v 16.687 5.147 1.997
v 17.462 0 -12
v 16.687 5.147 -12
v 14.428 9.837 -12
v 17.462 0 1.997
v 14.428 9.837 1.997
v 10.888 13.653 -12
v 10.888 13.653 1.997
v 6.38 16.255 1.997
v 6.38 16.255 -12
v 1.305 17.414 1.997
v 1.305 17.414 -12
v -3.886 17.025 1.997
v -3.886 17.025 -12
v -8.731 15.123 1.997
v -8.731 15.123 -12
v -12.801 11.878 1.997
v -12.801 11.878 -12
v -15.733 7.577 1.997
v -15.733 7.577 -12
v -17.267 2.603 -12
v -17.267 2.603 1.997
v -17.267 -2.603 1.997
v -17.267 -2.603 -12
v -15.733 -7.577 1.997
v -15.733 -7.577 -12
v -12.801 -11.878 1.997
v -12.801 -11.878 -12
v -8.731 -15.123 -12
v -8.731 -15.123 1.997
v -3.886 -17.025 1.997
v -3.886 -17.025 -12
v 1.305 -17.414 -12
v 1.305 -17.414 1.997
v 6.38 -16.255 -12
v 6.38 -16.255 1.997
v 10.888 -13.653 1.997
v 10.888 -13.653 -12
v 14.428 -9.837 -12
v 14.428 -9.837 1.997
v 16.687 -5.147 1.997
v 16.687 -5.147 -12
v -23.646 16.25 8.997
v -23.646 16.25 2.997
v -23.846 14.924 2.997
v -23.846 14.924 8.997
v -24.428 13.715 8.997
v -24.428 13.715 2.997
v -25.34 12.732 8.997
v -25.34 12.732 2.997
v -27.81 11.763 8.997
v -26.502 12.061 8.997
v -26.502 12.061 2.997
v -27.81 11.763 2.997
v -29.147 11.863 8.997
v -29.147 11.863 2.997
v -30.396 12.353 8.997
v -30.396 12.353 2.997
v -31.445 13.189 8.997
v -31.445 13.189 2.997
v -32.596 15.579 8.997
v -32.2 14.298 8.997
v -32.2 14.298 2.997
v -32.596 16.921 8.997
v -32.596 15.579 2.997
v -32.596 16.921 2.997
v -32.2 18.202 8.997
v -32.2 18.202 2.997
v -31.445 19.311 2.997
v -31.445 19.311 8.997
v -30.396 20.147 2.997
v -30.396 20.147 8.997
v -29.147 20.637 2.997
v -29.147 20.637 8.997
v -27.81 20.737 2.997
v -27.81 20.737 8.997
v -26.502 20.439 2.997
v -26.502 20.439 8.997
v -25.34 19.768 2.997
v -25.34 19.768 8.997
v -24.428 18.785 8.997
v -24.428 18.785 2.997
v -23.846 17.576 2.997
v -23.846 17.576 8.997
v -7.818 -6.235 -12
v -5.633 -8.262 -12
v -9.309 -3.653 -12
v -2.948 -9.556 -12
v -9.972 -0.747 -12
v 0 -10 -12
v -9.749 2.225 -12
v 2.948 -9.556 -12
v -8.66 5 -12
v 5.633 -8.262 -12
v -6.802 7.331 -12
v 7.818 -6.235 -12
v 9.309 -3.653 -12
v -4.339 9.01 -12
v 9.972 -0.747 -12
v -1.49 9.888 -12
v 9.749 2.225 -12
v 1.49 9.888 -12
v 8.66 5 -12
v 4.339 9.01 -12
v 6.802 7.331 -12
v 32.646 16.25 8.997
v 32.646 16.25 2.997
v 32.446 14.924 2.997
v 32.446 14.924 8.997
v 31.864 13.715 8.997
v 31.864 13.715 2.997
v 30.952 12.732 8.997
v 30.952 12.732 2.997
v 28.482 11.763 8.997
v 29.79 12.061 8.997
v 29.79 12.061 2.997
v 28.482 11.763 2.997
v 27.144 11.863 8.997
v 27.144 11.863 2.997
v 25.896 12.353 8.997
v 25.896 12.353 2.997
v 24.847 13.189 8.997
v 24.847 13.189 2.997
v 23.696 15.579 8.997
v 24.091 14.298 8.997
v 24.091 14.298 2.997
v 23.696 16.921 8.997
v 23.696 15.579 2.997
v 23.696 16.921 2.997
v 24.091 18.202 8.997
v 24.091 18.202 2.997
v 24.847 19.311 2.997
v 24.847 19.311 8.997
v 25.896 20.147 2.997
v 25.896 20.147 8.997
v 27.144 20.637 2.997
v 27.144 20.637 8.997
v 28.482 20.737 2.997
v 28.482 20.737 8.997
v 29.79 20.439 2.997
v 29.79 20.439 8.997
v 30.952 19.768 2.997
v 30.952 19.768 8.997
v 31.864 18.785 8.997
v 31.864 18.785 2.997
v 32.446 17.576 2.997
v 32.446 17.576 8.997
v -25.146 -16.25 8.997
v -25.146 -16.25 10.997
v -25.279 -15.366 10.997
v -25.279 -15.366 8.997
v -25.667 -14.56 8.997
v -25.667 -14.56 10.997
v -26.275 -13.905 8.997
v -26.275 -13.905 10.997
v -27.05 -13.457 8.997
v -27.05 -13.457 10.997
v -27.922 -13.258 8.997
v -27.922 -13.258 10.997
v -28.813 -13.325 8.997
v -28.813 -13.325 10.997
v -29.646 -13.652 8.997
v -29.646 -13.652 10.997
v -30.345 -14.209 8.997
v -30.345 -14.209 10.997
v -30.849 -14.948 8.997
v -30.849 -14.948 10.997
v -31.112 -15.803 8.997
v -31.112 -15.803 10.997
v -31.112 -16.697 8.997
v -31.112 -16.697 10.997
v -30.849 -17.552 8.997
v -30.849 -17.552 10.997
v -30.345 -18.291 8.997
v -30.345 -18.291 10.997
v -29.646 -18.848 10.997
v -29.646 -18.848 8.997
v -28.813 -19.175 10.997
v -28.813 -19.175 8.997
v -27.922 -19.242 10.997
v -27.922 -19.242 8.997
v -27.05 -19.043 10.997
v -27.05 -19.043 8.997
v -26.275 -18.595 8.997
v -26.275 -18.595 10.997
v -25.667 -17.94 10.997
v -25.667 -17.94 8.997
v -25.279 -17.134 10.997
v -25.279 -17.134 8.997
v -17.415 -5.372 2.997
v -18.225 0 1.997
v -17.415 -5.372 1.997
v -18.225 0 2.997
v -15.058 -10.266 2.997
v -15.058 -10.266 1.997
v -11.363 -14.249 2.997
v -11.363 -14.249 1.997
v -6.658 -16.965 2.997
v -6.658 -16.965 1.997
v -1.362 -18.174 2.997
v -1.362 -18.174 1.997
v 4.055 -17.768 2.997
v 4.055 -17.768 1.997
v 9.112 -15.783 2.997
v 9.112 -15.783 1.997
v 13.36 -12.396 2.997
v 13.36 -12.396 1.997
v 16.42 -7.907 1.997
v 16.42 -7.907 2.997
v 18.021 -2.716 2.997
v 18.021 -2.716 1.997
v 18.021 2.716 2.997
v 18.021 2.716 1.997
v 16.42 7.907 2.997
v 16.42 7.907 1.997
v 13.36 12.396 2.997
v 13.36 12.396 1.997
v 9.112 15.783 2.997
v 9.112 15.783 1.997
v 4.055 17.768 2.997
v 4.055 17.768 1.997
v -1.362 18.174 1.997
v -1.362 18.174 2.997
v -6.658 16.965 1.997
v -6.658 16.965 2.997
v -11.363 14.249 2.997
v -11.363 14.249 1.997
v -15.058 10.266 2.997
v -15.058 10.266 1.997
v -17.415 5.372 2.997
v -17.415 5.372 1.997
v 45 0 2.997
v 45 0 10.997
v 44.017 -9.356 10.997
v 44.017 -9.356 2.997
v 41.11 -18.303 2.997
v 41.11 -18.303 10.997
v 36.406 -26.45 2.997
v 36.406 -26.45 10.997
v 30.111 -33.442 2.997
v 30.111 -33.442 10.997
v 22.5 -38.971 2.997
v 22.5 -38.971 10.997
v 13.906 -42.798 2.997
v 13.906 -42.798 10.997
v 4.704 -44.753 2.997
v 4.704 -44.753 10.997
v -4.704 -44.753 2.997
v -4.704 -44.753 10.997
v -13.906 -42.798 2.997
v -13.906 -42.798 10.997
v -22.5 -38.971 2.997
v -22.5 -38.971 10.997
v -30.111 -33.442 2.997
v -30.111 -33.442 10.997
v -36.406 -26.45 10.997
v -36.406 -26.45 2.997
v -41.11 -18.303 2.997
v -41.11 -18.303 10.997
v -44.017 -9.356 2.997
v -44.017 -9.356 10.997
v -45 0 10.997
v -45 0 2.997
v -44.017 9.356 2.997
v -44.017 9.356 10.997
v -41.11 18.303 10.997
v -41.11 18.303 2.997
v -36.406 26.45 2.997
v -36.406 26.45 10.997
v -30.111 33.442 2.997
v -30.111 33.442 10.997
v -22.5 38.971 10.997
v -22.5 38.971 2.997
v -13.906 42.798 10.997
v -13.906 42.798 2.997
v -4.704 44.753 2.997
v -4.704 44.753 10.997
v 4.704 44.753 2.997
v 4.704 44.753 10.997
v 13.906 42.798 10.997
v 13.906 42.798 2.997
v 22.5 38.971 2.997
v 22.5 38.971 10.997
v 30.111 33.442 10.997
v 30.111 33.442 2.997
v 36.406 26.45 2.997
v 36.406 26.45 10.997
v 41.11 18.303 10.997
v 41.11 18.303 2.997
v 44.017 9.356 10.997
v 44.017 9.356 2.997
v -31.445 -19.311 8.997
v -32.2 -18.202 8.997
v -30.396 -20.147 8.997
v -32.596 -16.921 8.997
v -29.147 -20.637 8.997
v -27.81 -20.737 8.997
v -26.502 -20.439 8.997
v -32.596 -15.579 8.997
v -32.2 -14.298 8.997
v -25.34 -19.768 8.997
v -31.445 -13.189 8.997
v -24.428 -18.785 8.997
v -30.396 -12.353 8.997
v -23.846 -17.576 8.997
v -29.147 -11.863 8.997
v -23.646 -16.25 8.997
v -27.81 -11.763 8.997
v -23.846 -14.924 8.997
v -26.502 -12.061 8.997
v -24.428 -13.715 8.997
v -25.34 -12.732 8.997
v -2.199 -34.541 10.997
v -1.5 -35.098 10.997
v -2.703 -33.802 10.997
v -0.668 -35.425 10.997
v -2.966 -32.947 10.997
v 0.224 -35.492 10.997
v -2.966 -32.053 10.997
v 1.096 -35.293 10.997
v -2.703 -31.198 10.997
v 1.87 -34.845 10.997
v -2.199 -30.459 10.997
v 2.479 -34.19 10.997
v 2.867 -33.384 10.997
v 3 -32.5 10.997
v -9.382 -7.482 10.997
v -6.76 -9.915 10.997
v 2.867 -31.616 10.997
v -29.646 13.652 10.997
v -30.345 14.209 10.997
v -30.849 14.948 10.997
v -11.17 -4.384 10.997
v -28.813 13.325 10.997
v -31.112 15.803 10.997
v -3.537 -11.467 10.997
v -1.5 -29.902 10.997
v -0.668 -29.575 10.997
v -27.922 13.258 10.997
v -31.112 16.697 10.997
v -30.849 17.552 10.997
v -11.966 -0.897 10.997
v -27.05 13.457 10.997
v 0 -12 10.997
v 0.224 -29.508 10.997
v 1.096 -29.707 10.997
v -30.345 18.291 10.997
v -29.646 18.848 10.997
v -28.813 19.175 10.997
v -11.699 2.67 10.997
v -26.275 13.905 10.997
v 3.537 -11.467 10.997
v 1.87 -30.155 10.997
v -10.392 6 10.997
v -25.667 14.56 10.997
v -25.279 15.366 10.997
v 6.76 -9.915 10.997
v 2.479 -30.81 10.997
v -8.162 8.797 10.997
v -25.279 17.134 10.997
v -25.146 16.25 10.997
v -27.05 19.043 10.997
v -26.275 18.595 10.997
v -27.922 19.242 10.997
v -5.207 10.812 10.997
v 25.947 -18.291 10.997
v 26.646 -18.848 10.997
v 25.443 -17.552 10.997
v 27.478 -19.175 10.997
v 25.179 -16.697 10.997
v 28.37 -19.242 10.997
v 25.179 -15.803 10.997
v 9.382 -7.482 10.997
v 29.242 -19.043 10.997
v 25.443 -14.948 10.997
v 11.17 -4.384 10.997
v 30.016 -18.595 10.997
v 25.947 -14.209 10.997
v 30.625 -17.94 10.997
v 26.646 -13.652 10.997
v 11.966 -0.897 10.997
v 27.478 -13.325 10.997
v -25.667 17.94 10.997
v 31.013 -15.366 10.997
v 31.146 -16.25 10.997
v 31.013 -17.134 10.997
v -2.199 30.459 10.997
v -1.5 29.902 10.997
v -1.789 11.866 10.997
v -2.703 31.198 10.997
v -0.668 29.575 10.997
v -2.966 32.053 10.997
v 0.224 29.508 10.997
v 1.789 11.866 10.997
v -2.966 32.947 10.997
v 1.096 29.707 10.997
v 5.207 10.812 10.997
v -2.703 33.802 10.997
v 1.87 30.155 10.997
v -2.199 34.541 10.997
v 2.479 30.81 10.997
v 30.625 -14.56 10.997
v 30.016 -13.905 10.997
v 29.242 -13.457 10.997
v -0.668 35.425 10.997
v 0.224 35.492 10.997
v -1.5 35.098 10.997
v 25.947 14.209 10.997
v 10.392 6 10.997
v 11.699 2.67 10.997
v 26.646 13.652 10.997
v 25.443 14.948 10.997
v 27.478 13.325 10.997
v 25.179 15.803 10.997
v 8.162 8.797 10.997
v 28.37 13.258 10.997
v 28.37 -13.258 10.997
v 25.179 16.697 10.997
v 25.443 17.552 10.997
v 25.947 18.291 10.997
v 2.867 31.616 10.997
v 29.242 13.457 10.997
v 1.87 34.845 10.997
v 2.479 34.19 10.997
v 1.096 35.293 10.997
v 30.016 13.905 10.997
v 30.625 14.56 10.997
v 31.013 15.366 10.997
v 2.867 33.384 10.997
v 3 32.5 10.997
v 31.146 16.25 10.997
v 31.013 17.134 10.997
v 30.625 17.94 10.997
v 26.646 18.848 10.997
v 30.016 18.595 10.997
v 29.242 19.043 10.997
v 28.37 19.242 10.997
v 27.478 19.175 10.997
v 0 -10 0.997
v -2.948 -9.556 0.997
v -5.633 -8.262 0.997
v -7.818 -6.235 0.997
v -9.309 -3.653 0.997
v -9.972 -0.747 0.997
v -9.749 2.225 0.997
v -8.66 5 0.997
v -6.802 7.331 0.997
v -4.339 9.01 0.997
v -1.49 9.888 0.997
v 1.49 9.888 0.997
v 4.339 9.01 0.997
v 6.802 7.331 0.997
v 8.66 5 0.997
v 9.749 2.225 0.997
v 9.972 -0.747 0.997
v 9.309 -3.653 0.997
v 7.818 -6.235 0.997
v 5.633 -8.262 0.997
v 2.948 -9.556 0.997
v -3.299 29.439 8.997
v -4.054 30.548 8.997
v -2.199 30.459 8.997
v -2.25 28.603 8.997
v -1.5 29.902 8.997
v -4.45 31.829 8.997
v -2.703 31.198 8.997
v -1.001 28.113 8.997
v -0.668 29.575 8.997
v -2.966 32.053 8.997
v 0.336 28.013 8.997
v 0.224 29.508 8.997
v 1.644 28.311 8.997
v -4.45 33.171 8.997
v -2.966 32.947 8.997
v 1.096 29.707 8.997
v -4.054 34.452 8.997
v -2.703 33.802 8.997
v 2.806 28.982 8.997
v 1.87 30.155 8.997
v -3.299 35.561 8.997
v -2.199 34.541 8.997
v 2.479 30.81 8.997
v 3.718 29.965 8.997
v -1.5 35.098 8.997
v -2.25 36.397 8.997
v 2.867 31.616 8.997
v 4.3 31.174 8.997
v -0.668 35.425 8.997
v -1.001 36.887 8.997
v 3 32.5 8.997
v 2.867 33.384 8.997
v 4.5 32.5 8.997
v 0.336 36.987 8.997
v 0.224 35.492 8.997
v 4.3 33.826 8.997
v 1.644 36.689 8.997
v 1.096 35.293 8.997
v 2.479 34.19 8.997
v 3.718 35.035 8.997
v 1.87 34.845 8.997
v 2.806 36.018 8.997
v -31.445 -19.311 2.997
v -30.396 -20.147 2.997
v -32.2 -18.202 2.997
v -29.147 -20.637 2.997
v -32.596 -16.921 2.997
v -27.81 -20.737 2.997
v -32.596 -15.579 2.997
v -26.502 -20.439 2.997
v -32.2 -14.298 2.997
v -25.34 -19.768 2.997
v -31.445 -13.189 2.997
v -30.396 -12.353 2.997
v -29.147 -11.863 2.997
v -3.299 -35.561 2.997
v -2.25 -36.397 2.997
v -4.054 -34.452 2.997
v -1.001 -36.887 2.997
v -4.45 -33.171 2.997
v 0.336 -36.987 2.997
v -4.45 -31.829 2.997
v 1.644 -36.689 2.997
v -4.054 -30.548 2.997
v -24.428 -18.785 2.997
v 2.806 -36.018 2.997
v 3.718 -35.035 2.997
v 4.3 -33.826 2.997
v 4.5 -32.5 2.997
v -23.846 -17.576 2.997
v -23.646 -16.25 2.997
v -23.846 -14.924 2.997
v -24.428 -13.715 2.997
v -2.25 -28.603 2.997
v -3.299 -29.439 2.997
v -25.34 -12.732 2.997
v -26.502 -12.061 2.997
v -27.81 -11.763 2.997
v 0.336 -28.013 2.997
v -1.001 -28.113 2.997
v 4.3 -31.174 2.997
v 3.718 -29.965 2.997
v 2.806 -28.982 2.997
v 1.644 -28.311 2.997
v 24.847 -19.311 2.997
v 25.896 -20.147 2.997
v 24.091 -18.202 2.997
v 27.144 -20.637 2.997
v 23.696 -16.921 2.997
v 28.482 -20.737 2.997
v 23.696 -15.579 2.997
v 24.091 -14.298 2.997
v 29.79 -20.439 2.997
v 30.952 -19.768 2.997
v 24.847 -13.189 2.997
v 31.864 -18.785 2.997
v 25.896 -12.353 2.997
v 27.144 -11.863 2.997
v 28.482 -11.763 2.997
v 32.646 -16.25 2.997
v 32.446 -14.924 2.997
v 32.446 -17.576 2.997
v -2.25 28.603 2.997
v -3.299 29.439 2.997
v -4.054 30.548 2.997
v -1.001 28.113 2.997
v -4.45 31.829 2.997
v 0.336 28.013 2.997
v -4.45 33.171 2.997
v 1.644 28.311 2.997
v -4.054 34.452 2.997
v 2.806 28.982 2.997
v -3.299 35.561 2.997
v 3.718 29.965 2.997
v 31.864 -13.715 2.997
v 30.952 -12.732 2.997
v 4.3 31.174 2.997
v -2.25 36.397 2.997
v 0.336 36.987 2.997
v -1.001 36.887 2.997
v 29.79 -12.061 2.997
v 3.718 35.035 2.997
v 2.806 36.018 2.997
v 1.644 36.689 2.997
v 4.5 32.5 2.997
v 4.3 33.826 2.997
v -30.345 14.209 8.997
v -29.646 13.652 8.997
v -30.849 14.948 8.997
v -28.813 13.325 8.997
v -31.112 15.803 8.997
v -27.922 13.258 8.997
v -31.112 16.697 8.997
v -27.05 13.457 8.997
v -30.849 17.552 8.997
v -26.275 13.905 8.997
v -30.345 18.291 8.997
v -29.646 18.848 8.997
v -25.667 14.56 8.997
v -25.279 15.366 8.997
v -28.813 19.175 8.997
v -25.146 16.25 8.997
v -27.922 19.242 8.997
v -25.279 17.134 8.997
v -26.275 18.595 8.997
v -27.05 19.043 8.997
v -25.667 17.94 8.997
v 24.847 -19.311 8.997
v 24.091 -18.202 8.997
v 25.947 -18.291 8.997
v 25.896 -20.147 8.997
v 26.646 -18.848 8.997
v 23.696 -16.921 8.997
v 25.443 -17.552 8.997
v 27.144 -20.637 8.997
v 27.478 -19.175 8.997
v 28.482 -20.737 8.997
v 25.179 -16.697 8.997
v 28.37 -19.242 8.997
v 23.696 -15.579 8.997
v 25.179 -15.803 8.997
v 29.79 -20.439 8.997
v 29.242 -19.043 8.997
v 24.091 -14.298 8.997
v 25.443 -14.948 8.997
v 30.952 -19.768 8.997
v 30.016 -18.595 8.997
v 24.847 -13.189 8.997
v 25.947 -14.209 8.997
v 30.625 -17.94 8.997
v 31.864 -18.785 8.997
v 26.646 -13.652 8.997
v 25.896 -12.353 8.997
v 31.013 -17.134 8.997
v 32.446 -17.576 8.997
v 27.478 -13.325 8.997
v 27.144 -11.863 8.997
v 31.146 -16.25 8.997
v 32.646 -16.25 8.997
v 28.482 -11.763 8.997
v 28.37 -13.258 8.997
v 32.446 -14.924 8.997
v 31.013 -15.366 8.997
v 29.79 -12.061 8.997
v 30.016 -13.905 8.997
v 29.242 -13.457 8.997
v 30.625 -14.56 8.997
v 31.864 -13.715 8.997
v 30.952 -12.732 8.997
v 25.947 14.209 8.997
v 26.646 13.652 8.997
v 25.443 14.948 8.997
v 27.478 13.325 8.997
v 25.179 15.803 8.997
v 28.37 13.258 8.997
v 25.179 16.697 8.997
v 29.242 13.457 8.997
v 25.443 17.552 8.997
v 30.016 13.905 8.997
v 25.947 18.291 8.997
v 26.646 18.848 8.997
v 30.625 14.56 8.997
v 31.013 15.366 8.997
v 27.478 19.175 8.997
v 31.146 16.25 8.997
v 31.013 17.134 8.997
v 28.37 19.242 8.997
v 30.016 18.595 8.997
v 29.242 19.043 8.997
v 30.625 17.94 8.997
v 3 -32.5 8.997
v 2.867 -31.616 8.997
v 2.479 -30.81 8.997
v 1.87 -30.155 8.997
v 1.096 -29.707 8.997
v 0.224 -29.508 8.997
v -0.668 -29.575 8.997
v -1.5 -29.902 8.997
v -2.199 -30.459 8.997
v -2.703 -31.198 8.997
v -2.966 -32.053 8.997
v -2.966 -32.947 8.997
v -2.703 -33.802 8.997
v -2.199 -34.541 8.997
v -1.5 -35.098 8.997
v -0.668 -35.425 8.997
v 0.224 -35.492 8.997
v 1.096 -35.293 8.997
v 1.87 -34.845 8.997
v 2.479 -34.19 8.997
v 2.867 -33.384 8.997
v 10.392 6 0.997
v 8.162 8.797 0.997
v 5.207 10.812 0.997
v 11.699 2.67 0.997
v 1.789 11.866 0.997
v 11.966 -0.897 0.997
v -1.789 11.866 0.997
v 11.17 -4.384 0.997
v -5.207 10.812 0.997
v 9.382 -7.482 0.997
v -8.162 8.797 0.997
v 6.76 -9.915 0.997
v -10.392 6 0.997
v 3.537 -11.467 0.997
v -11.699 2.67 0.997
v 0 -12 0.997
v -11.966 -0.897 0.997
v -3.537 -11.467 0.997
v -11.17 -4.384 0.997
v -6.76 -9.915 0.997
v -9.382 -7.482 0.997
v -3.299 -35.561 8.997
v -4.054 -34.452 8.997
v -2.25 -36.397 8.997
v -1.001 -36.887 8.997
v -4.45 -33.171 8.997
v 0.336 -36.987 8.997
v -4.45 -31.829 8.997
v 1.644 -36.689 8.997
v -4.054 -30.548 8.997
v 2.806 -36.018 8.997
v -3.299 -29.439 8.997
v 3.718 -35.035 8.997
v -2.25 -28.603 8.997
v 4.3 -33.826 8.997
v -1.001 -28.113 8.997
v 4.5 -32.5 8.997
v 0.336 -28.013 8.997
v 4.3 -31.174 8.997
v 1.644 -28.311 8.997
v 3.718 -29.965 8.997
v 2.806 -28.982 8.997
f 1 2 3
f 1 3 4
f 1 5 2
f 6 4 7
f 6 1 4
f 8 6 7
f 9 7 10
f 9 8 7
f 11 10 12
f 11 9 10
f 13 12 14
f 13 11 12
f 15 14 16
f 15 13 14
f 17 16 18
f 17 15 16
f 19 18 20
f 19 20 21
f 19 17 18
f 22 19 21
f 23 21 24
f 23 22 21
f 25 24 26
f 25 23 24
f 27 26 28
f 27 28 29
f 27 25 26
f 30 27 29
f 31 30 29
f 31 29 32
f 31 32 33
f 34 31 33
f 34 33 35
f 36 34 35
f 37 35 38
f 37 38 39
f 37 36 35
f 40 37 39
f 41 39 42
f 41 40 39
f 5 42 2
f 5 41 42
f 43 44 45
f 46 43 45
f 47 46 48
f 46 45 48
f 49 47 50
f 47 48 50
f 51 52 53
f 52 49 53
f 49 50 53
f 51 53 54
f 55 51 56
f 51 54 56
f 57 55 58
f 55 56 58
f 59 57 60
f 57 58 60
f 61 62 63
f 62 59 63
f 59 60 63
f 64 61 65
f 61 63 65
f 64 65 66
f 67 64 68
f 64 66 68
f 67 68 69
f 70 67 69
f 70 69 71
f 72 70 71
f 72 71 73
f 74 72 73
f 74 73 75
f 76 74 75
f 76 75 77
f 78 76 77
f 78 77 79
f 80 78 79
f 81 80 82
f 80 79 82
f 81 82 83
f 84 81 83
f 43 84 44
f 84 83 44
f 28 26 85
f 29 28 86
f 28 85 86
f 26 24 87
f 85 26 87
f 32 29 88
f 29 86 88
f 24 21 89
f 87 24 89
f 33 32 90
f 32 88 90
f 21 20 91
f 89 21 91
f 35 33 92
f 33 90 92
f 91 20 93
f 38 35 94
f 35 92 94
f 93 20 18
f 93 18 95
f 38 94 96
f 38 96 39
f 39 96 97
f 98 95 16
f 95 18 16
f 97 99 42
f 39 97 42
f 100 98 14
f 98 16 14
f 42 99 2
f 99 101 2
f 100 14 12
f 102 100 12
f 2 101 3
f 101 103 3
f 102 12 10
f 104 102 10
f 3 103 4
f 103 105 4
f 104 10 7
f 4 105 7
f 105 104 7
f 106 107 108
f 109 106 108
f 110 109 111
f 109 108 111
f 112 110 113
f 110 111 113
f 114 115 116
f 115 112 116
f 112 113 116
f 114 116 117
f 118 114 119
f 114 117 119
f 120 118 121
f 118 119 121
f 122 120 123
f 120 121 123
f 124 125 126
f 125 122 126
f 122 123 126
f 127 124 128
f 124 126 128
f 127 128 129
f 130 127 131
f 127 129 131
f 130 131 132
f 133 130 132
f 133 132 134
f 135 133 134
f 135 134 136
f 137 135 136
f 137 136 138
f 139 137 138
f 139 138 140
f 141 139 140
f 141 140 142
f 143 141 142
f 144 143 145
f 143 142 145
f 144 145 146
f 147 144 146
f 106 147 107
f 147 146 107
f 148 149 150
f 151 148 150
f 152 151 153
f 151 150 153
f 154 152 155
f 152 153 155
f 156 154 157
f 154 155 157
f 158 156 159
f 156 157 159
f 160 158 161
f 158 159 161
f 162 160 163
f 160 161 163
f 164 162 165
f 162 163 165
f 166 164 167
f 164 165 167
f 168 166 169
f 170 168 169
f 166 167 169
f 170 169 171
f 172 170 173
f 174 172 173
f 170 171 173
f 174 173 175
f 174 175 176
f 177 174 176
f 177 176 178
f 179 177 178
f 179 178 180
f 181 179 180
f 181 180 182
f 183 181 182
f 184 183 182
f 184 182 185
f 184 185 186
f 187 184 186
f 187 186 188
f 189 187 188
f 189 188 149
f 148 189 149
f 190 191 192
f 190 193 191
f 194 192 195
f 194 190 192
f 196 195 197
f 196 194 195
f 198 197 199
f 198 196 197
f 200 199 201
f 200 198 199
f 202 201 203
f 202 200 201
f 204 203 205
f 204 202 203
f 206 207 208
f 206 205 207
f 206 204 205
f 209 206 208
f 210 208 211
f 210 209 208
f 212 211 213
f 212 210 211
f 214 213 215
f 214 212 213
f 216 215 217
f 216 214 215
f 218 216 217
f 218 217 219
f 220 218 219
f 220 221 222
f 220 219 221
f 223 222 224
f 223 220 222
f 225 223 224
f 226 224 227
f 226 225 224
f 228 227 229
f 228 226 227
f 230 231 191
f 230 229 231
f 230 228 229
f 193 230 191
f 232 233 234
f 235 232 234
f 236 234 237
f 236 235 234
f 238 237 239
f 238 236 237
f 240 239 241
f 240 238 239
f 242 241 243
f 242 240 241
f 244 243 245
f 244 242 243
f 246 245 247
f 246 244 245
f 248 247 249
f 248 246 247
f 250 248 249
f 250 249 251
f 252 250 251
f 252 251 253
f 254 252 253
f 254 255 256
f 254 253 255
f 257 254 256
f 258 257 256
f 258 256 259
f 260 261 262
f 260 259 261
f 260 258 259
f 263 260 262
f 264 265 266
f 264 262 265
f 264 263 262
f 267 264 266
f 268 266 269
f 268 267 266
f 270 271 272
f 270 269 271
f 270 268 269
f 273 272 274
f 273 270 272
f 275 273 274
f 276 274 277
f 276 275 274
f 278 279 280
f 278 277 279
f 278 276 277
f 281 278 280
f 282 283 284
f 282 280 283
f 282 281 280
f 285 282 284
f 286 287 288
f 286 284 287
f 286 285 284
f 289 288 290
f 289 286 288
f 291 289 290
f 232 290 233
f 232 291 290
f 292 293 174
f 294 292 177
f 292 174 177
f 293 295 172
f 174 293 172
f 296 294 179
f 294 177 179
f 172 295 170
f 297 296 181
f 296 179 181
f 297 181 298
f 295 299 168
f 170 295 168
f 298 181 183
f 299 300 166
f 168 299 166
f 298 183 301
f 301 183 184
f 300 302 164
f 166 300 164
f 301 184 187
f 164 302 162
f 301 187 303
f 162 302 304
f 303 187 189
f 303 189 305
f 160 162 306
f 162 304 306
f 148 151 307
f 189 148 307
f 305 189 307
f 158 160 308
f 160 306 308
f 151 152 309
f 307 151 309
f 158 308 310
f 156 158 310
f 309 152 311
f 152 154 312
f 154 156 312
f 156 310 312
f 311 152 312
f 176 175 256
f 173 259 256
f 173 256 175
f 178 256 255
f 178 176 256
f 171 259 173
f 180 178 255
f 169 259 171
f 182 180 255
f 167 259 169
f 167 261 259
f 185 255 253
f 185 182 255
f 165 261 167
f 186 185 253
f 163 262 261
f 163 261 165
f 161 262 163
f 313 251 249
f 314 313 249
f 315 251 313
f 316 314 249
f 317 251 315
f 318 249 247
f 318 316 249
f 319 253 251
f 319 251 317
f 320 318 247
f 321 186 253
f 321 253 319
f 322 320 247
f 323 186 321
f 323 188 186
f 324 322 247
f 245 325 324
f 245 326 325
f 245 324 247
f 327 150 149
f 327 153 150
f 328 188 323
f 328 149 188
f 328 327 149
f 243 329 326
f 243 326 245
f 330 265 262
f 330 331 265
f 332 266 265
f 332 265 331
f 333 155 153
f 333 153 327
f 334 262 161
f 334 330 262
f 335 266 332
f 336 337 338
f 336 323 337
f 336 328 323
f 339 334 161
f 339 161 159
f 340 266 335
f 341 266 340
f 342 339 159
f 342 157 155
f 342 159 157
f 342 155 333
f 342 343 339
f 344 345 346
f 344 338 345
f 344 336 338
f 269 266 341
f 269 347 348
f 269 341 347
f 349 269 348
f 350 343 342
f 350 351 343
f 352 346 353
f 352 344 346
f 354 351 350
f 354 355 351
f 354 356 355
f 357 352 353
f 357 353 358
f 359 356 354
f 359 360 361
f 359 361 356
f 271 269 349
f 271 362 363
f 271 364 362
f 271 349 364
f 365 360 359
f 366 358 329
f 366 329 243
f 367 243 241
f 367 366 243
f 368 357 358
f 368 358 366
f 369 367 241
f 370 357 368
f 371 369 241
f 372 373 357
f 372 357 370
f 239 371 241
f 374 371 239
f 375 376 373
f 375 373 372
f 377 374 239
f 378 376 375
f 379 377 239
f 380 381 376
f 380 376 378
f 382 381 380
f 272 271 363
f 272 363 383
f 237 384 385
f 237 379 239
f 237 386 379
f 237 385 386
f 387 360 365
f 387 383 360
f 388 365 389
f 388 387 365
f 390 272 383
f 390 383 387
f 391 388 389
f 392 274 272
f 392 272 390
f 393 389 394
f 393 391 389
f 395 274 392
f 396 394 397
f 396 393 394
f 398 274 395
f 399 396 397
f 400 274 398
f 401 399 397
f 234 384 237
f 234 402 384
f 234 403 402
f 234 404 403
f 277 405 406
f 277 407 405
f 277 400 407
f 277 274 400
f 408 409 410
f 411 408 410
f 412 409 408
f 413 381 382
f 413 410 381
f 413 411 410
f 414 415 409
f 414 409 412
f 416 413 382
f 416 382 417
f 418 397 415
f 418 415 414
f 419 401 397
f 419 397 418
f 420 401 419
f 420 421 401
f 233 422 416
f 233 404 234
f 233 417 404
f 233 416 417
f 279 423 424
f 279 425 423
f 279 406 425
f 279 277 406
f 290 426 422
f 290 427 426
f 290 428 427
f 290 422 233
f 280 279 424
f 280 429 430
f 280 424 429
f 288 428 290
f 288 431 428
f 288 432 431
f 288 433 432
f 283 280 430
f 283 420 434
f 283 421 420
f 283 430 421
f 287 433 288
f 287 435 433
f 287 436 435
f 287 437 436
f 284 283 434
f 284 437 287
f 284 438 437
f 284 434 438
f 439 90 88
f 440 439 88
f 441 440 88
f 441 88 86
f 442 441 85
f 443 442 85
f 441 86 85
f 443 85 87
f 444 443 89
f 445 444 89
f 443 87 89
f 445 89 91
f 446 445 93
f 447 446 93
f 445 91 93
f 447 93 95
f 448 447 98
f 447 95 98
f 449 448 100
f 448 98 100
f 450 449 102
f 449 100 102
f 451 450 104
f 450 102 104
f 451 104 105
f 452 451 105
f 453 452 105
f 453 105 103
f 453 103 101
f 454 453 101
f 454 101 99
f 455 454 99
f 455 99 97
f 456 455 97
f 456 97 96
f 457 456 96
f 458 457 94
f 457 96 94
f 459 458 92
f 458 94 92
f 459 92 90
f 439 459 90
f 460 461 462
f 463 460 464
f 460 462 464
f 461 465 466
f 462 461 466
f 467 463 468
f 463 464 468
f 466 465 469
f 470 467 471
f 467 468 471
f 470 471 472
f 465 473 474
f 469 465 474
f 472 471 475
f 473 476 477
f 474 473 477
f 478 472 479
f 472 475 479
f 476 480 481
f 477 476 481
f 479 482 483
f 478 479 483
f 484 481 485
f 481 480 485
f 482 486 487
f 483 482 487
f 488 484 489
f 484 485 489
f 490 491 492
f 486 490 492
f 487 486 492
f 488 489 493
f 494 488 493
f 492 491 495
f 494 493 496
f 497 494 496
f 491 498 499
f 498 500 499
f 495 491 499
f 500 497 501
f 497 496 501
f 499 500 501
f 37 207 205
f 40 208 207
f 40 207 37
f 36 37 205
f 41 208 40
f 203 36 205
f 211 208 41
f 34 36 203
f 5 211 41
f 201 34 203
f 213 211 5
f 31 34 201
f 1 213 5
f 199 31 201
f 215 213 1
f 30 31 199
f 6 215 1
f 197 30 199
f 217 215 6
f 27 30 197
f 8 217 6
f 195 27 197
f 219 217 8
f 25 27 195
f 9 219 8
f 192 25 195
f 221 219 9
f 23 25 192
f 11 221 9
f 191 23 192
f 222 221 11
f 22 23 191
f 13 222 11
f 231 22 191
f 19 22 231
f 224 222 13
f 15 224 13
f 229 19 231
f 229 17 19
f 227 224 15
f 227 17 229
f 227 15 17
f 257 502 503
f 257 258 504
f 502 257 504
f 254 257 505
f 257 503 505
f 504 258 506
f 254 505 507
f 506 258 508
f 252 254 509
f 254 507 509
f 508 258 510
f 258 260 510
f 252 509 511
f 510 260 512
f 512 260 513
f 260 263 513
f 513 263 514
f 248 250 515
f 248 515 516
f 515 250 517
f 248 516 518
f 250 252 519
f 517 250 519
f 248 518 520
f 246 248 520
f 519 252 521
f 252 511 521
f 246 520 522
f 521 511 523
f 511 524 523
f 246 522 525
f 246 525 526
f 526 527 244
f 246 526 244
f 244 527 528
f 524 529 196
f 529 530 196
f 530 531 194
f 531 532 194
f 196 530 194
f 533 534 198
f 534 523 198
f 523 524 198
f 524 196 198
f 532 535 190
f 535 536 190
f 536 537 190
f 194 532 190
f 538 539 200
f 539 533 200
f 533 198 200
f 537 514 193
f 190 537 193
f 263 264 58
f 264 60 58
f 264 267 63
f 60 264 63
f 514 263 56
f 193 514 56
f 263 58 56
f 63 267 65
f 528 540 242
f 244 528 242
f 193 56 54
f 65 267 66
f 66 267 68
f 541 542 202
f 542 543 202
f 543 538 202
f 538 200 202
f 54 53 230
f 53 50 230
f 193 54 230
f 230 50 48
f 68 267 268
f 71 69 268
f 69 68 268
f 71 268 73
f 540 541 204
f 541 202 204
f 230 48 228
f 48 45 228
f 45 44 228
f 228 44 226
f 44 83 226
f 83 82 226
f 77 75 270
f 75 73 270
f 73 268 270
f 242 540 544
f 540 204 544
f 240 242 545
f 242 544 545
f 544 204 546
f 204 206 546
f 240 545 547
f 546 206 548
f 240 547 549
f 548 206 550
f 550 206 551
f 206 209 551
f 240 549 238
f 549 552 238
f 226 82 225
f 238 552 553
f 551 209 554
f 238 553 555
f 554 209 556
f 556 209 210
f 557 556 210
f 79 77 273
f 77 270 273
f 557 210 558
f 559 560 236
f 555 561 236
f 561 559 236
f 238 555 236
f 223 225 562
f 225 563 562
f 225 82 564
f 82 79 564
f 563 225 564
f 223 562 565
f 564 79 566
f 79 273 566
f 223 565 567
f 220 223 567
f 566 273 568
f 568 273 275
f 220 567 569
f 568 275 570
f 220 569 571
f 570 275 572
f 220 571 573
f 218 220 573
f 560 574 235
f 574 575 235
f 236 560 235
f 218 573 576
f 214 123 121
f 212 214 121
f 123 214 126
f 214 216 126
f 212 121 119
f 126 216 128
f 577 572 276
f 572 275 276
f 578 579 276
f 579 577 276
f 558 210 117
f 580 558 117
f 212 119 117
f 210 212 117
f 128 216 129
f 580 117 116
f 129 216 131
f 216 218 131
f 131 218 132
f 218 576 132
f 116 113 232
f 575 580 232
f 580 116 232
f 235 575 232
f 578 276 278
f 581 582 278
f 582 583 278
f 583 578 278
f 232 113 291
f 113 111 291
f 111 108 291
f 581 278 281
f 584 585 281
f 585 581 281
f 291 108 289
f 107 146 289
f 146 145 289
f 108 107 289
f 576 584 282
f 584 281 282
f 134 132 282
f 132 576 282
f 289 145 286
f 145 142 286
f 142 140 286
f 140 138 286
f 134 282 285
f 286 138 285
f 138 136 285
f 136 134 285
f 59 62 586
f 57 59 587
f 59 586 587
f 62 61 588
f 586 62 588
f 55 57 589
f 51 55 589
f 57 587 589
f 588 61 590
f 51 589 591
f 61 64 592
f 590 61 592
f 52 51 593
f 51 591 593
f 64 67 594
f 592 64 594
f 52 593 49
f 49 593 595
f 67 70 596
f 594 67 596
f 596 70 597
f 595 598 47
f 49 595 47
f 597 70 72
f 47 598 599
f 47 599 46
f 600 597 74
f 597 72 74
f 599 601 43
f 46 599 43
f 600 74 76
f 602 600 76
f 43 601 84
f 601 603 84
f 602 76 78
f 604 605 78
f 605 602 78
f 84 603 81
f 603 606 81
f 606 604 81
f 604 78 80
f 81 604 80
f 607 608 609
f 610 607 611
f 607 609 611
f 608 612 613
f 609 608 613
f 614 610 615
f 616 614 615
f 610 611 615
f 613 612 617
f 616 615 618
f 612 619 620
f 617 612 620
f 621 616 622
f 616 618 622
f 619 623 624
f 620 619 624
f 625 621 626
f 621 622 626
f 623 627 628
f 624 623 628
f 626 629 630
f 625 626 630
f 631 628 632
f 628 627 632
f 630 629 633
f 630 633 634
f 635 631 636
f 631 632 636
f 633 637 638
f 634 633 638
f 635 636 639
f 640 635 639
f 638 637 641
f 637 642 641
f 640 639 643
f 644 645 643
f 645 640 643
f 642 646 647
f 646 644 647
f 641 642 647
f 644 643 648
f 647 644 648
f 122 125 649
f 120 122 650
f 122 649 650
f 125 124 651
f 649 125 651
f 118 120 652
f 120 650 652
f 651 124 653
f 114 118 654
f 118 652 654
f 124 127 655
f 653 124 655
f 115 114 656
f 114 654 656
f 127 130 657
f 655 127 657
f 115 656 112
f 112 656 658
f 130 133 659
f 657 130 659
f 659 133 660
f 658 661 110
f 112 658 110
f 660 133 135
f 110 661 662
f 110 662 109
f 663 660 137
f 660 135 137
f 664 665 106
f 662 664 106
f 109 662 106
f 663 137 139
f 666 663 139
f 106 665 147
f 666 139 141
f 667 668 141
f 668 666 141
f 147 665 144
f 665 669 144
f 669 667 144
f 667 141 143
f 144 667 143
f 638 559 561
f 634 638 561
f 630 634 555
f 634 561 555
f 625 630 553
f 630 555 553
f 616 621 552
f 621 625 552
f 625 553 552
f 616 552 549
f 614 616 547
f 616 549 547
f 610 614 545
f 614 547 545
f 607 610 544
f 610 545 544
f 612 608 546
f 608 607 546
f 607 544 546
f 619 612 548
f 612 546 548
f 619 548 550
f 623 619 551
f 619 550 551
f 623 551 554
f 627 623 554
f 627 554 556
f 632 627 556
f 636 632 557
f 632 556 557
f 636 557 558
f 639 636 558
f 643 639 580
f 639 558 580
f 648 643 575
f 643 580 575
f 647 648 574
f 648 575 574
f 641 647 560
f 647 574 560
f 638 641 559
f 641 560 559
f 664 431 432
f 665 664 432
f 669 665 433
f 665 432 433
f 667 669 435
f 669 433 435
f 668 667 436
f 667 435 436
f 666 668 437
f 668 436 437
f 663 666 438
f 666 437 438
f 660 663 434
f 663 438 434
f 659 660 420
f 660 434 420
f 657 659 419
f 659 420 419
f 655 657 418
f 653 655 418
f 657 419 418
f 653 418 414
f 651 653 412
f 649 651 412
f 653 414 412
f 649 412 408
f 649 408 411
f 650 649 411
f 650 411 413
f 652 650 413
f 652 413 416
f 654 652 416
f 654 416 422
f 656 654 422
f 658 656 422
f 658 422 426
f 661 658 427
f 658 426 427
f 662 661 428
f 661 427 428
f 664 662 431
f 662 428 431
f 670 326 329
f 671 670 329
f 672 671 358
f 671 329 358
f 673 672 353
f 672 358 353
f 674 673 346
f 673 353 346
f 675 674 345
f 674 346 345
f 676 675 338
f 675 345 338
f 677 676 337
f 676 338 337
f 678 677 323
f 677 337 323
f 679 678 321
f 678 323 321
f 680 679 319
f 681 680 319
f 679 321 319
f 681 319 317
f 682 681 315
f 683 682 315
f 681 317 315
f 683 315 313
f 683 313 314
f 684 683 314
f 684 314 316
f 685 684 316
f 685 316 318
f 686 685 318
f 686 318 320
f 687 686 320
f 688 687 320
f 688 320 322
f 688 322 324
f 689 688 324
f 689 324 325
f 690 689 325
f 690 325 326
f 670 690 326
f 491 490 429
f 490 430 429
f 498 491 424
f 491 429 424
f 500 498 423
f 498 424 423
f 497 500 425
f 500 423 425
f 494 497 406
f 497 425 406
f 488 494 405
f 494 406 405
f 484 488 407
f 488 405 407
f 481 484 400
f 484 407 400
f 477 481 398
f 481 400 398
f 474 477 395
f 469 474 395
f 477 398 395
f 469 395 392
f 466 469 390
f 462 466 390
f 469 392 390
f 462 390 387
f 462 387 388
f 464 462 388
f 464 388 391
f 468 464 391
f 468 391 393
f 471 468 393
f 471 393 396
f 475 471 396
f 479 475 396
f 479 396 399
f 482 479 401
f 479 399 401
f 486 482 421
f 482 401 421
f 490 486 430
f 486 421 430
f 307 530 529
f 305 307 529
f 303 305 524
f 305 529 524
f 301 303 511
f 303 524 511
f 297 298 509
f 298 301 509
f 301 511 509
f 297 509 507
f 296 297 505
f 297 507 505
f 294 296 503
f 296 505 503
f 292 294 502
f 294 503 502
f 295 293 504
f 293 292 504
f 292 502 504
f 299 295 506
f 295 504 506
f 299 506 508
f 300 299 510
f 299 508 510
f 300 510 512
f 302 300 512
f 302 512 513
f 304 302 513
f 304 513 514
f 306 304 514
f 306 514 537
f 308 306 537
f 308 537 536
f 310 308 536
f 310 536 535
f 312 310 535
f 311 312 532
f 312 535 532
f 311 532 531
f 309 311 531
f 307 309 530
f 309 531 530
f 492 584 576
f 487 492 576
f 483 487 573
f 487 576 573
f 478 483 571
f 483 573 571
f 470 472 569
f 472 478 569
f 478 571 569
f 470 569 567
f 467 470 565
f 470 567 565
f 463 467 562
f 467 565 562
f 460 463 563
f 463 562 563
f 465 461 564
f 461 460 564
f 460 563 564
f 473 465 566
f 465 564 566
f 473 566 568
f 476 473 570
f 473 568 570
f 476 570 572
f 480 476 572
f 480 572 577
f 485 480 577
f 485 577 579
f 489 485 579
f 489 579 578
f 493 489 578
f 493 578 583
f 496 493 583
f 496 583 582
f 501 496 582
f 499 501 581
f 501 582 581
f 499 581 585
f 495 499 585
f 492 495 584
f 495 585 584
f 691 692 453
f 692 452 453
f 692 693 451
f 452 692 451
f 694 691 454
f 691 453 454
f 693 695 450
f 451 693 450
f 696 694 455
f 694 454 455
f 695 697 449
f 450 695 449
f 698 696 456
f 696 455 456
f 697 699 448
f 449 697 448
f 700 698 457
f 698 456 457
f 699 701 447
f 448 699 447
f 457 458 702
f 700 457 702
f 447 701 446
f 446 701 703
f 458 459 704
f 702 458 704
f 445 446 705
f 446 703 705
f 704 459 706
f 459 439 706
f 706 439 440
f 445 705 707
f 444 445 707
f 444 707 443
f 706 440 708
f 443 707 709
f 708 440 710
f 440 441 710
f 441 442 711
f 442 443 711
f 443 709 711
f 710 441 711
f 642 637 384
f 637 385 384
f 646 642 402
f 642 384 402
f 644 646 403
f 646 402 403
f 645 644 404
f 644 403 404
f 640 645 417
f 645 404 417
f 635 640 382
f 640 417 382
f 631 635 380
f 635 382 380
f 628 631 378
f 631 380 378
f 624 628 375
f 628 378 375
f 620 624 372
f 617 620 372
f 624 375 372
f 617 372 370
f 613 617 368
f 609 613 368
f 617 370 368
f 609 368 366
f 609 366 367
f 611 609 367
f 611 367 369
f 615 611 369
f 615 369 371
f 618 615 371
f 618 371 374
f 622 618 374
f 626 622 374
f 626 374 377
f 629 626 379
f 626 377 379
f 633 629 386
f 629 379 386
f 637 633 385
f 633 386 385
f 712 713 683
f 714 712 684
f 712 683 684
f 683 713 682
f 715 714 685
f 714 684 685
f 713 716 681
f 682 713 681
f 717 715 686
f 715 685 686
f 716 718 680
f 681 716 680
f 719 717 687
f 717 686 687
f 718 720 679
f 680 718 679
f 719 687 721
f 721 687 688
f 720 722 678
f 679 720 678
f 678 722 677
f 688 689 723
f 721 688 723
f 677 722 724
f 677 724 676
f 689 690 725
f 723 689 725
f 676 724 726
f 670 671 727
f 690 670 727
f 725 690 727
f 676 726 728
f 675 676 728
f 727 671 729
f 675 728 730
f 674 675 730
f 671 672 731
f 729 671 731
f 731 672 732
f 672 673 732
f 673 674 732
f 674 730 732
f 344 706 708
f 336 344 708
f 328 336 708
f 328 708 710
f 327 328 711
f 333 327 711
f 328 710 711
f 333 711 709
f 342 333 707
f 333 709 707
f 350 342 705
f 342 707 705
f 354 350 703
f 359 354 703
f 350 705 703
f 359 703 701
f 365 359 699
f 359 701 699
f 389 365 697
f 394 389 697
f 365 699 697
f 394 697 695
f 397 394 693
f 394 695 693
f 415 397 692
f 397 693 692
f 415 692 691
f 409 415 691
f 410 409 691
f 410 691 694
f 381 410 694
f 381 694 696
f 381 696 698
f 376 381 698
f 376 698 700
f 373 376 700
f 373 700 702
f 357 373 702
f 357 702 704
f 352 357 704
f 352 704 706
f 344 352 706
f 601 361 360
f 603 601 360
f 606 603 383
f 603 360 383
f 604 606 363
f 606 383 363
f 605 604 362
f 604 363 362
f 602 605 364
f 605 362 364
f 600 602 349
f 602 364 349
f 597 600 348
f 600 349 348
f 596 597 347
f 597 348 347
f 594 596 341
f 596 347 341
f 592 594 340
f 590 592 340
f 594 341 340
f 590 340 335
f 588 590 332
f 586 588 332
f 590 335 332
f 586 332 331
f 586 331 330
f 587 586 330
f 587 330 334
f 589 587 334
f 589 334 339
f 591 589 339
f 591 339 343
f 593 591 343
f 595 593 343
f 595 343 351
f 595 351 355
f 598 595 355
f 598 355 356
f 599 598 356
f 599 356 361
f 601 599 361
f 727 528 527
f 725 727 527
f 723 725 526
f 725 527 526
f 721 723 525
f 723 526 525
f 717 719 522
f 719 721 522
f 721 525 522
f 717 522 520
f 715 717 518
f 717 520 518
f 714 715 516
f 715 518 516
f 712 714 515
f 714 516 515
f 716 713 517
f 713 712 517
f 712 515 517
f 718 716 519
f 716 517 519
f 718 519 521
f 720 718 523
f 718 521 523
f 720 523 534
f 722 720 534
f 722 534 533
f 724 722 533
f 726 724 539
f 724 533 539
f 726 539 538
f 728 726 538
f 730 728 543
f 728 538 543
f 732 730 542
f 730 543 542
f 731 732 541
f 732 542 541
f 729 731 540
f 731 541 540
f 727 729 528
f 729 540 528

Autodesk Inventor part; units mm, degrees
ref_plane "YZ Plane" through (0, 0, 0) normal (1, 0, 0) x (0, 1, 0)
ref_plane "Work Plane1" through (0, 0, 2.9972) normal (0, 0, 1) x (1, 0, 0)
sketch "Sketch1" plane through (0, 0, 2.9972) normal (0, 0, 1) x (1, 0, 0)
  circle A0 centre (0, 0) radius 17.4625
  circle A1 centre (0, 0) radius 32.5 construction
  circle A2 centre (0, 0) radius 45
  circle A3 centre (0, -32.5) radius 4.5
  circle A4 centre (28.1458, -16.25) radius 4.5
  circle A5 centre (28.1458, 16.25) radius 4.5
  circle A6 centre (0, 32.5) radius 4.5
  circle A7 centre (-28.1458, 16.25) radius 4.5
  circle A8 centre (-28.1458, -16.25) radius 4.5
  point P0 (0, 0)
  dimension "d1" = 65
  dimension "d0" = 34.925
  dimension "d2" = 90
  dimension "d3" = 9
  dimension "d6" = 360
extrude "Extrusion1" add sketch "Sketch1" along normal blind 8 contours A0 | A2
ref_plane "Work Plane2" through (-75, -75, -12) normal (0, 0, -1) x (0, 1, 0)
extrude "Extrusion2" add sketch "Sketch1" against normal up to surface (14.9972 mm away) contours A0
sketch "Sketch3" plane through (0, 0, 10.9972) normal (0, 0, 1) x (1, 0, 0)
  circle A0 centre (-28.1458, -16.25) radius 4.5 projected
  circle A1 centre (-28.1458, -16.25) radius 3
  circle A2 centre (0, 32.5) radius 4.5 projected
  circle A3 centre (0, 32.5) radius 3
  circle A4 centre (-28.1458, 16.25) radius 4.5 projected
  circle A5 centre (-28.1458, 16.25) radius 3
  circle A6 centre (28.1458, 16.25) radius 4.5 projected
  circle A7 centre (28.1458, 16.25) radius 3
  circle A8 centre (28.1458, -16.25) radius 4.5 projected
  circle A9 centre (28.1458, -16.25) radius 3
  circle A10 centre (0, -32.5) radius 4.5 projected
  circle A11 centre (0, -32.5) radius 3
  point P0 (0, 0)
  dimension "d12" = 6
  dimension "d13" = 6
  dimension "d14" = 6
  dimension "d15" = 6
  dimension "d16" = 6
  dimension "d17" = 6
extrude "Extrusion3" add sketch "Sketch3" against normal blind 2
sketch "Sketch4" plane through (0, 0, 10.9972) normal (0, 0, 1) x (1, 0, 0)
  point P0 (0, 0)
  point P1 (0, 0)
hole "Hole1" at (0, 0, 10.9972) direction (0, 0, -1) diameter 20 end through all counterbore diameter 24 counterbore depth 10
sketch "Sketch5" plane through (0, 0, 2.9972) normal (0, 0, -1) x (-1, 0, 0)
  circle A0 centre (0, 0) radius 15.7248
  circle A1 centre (0, 0) radius 18.2248
  circle A2 centre (0, 0) radius 17.4625 projected
  point P0 (0, 0)
  dimension "d27" = 2.5
extrude "Extrusion4" add sketch "Sketch5" along normal blind 1 contours A1
properties part number "Input pin holder"
